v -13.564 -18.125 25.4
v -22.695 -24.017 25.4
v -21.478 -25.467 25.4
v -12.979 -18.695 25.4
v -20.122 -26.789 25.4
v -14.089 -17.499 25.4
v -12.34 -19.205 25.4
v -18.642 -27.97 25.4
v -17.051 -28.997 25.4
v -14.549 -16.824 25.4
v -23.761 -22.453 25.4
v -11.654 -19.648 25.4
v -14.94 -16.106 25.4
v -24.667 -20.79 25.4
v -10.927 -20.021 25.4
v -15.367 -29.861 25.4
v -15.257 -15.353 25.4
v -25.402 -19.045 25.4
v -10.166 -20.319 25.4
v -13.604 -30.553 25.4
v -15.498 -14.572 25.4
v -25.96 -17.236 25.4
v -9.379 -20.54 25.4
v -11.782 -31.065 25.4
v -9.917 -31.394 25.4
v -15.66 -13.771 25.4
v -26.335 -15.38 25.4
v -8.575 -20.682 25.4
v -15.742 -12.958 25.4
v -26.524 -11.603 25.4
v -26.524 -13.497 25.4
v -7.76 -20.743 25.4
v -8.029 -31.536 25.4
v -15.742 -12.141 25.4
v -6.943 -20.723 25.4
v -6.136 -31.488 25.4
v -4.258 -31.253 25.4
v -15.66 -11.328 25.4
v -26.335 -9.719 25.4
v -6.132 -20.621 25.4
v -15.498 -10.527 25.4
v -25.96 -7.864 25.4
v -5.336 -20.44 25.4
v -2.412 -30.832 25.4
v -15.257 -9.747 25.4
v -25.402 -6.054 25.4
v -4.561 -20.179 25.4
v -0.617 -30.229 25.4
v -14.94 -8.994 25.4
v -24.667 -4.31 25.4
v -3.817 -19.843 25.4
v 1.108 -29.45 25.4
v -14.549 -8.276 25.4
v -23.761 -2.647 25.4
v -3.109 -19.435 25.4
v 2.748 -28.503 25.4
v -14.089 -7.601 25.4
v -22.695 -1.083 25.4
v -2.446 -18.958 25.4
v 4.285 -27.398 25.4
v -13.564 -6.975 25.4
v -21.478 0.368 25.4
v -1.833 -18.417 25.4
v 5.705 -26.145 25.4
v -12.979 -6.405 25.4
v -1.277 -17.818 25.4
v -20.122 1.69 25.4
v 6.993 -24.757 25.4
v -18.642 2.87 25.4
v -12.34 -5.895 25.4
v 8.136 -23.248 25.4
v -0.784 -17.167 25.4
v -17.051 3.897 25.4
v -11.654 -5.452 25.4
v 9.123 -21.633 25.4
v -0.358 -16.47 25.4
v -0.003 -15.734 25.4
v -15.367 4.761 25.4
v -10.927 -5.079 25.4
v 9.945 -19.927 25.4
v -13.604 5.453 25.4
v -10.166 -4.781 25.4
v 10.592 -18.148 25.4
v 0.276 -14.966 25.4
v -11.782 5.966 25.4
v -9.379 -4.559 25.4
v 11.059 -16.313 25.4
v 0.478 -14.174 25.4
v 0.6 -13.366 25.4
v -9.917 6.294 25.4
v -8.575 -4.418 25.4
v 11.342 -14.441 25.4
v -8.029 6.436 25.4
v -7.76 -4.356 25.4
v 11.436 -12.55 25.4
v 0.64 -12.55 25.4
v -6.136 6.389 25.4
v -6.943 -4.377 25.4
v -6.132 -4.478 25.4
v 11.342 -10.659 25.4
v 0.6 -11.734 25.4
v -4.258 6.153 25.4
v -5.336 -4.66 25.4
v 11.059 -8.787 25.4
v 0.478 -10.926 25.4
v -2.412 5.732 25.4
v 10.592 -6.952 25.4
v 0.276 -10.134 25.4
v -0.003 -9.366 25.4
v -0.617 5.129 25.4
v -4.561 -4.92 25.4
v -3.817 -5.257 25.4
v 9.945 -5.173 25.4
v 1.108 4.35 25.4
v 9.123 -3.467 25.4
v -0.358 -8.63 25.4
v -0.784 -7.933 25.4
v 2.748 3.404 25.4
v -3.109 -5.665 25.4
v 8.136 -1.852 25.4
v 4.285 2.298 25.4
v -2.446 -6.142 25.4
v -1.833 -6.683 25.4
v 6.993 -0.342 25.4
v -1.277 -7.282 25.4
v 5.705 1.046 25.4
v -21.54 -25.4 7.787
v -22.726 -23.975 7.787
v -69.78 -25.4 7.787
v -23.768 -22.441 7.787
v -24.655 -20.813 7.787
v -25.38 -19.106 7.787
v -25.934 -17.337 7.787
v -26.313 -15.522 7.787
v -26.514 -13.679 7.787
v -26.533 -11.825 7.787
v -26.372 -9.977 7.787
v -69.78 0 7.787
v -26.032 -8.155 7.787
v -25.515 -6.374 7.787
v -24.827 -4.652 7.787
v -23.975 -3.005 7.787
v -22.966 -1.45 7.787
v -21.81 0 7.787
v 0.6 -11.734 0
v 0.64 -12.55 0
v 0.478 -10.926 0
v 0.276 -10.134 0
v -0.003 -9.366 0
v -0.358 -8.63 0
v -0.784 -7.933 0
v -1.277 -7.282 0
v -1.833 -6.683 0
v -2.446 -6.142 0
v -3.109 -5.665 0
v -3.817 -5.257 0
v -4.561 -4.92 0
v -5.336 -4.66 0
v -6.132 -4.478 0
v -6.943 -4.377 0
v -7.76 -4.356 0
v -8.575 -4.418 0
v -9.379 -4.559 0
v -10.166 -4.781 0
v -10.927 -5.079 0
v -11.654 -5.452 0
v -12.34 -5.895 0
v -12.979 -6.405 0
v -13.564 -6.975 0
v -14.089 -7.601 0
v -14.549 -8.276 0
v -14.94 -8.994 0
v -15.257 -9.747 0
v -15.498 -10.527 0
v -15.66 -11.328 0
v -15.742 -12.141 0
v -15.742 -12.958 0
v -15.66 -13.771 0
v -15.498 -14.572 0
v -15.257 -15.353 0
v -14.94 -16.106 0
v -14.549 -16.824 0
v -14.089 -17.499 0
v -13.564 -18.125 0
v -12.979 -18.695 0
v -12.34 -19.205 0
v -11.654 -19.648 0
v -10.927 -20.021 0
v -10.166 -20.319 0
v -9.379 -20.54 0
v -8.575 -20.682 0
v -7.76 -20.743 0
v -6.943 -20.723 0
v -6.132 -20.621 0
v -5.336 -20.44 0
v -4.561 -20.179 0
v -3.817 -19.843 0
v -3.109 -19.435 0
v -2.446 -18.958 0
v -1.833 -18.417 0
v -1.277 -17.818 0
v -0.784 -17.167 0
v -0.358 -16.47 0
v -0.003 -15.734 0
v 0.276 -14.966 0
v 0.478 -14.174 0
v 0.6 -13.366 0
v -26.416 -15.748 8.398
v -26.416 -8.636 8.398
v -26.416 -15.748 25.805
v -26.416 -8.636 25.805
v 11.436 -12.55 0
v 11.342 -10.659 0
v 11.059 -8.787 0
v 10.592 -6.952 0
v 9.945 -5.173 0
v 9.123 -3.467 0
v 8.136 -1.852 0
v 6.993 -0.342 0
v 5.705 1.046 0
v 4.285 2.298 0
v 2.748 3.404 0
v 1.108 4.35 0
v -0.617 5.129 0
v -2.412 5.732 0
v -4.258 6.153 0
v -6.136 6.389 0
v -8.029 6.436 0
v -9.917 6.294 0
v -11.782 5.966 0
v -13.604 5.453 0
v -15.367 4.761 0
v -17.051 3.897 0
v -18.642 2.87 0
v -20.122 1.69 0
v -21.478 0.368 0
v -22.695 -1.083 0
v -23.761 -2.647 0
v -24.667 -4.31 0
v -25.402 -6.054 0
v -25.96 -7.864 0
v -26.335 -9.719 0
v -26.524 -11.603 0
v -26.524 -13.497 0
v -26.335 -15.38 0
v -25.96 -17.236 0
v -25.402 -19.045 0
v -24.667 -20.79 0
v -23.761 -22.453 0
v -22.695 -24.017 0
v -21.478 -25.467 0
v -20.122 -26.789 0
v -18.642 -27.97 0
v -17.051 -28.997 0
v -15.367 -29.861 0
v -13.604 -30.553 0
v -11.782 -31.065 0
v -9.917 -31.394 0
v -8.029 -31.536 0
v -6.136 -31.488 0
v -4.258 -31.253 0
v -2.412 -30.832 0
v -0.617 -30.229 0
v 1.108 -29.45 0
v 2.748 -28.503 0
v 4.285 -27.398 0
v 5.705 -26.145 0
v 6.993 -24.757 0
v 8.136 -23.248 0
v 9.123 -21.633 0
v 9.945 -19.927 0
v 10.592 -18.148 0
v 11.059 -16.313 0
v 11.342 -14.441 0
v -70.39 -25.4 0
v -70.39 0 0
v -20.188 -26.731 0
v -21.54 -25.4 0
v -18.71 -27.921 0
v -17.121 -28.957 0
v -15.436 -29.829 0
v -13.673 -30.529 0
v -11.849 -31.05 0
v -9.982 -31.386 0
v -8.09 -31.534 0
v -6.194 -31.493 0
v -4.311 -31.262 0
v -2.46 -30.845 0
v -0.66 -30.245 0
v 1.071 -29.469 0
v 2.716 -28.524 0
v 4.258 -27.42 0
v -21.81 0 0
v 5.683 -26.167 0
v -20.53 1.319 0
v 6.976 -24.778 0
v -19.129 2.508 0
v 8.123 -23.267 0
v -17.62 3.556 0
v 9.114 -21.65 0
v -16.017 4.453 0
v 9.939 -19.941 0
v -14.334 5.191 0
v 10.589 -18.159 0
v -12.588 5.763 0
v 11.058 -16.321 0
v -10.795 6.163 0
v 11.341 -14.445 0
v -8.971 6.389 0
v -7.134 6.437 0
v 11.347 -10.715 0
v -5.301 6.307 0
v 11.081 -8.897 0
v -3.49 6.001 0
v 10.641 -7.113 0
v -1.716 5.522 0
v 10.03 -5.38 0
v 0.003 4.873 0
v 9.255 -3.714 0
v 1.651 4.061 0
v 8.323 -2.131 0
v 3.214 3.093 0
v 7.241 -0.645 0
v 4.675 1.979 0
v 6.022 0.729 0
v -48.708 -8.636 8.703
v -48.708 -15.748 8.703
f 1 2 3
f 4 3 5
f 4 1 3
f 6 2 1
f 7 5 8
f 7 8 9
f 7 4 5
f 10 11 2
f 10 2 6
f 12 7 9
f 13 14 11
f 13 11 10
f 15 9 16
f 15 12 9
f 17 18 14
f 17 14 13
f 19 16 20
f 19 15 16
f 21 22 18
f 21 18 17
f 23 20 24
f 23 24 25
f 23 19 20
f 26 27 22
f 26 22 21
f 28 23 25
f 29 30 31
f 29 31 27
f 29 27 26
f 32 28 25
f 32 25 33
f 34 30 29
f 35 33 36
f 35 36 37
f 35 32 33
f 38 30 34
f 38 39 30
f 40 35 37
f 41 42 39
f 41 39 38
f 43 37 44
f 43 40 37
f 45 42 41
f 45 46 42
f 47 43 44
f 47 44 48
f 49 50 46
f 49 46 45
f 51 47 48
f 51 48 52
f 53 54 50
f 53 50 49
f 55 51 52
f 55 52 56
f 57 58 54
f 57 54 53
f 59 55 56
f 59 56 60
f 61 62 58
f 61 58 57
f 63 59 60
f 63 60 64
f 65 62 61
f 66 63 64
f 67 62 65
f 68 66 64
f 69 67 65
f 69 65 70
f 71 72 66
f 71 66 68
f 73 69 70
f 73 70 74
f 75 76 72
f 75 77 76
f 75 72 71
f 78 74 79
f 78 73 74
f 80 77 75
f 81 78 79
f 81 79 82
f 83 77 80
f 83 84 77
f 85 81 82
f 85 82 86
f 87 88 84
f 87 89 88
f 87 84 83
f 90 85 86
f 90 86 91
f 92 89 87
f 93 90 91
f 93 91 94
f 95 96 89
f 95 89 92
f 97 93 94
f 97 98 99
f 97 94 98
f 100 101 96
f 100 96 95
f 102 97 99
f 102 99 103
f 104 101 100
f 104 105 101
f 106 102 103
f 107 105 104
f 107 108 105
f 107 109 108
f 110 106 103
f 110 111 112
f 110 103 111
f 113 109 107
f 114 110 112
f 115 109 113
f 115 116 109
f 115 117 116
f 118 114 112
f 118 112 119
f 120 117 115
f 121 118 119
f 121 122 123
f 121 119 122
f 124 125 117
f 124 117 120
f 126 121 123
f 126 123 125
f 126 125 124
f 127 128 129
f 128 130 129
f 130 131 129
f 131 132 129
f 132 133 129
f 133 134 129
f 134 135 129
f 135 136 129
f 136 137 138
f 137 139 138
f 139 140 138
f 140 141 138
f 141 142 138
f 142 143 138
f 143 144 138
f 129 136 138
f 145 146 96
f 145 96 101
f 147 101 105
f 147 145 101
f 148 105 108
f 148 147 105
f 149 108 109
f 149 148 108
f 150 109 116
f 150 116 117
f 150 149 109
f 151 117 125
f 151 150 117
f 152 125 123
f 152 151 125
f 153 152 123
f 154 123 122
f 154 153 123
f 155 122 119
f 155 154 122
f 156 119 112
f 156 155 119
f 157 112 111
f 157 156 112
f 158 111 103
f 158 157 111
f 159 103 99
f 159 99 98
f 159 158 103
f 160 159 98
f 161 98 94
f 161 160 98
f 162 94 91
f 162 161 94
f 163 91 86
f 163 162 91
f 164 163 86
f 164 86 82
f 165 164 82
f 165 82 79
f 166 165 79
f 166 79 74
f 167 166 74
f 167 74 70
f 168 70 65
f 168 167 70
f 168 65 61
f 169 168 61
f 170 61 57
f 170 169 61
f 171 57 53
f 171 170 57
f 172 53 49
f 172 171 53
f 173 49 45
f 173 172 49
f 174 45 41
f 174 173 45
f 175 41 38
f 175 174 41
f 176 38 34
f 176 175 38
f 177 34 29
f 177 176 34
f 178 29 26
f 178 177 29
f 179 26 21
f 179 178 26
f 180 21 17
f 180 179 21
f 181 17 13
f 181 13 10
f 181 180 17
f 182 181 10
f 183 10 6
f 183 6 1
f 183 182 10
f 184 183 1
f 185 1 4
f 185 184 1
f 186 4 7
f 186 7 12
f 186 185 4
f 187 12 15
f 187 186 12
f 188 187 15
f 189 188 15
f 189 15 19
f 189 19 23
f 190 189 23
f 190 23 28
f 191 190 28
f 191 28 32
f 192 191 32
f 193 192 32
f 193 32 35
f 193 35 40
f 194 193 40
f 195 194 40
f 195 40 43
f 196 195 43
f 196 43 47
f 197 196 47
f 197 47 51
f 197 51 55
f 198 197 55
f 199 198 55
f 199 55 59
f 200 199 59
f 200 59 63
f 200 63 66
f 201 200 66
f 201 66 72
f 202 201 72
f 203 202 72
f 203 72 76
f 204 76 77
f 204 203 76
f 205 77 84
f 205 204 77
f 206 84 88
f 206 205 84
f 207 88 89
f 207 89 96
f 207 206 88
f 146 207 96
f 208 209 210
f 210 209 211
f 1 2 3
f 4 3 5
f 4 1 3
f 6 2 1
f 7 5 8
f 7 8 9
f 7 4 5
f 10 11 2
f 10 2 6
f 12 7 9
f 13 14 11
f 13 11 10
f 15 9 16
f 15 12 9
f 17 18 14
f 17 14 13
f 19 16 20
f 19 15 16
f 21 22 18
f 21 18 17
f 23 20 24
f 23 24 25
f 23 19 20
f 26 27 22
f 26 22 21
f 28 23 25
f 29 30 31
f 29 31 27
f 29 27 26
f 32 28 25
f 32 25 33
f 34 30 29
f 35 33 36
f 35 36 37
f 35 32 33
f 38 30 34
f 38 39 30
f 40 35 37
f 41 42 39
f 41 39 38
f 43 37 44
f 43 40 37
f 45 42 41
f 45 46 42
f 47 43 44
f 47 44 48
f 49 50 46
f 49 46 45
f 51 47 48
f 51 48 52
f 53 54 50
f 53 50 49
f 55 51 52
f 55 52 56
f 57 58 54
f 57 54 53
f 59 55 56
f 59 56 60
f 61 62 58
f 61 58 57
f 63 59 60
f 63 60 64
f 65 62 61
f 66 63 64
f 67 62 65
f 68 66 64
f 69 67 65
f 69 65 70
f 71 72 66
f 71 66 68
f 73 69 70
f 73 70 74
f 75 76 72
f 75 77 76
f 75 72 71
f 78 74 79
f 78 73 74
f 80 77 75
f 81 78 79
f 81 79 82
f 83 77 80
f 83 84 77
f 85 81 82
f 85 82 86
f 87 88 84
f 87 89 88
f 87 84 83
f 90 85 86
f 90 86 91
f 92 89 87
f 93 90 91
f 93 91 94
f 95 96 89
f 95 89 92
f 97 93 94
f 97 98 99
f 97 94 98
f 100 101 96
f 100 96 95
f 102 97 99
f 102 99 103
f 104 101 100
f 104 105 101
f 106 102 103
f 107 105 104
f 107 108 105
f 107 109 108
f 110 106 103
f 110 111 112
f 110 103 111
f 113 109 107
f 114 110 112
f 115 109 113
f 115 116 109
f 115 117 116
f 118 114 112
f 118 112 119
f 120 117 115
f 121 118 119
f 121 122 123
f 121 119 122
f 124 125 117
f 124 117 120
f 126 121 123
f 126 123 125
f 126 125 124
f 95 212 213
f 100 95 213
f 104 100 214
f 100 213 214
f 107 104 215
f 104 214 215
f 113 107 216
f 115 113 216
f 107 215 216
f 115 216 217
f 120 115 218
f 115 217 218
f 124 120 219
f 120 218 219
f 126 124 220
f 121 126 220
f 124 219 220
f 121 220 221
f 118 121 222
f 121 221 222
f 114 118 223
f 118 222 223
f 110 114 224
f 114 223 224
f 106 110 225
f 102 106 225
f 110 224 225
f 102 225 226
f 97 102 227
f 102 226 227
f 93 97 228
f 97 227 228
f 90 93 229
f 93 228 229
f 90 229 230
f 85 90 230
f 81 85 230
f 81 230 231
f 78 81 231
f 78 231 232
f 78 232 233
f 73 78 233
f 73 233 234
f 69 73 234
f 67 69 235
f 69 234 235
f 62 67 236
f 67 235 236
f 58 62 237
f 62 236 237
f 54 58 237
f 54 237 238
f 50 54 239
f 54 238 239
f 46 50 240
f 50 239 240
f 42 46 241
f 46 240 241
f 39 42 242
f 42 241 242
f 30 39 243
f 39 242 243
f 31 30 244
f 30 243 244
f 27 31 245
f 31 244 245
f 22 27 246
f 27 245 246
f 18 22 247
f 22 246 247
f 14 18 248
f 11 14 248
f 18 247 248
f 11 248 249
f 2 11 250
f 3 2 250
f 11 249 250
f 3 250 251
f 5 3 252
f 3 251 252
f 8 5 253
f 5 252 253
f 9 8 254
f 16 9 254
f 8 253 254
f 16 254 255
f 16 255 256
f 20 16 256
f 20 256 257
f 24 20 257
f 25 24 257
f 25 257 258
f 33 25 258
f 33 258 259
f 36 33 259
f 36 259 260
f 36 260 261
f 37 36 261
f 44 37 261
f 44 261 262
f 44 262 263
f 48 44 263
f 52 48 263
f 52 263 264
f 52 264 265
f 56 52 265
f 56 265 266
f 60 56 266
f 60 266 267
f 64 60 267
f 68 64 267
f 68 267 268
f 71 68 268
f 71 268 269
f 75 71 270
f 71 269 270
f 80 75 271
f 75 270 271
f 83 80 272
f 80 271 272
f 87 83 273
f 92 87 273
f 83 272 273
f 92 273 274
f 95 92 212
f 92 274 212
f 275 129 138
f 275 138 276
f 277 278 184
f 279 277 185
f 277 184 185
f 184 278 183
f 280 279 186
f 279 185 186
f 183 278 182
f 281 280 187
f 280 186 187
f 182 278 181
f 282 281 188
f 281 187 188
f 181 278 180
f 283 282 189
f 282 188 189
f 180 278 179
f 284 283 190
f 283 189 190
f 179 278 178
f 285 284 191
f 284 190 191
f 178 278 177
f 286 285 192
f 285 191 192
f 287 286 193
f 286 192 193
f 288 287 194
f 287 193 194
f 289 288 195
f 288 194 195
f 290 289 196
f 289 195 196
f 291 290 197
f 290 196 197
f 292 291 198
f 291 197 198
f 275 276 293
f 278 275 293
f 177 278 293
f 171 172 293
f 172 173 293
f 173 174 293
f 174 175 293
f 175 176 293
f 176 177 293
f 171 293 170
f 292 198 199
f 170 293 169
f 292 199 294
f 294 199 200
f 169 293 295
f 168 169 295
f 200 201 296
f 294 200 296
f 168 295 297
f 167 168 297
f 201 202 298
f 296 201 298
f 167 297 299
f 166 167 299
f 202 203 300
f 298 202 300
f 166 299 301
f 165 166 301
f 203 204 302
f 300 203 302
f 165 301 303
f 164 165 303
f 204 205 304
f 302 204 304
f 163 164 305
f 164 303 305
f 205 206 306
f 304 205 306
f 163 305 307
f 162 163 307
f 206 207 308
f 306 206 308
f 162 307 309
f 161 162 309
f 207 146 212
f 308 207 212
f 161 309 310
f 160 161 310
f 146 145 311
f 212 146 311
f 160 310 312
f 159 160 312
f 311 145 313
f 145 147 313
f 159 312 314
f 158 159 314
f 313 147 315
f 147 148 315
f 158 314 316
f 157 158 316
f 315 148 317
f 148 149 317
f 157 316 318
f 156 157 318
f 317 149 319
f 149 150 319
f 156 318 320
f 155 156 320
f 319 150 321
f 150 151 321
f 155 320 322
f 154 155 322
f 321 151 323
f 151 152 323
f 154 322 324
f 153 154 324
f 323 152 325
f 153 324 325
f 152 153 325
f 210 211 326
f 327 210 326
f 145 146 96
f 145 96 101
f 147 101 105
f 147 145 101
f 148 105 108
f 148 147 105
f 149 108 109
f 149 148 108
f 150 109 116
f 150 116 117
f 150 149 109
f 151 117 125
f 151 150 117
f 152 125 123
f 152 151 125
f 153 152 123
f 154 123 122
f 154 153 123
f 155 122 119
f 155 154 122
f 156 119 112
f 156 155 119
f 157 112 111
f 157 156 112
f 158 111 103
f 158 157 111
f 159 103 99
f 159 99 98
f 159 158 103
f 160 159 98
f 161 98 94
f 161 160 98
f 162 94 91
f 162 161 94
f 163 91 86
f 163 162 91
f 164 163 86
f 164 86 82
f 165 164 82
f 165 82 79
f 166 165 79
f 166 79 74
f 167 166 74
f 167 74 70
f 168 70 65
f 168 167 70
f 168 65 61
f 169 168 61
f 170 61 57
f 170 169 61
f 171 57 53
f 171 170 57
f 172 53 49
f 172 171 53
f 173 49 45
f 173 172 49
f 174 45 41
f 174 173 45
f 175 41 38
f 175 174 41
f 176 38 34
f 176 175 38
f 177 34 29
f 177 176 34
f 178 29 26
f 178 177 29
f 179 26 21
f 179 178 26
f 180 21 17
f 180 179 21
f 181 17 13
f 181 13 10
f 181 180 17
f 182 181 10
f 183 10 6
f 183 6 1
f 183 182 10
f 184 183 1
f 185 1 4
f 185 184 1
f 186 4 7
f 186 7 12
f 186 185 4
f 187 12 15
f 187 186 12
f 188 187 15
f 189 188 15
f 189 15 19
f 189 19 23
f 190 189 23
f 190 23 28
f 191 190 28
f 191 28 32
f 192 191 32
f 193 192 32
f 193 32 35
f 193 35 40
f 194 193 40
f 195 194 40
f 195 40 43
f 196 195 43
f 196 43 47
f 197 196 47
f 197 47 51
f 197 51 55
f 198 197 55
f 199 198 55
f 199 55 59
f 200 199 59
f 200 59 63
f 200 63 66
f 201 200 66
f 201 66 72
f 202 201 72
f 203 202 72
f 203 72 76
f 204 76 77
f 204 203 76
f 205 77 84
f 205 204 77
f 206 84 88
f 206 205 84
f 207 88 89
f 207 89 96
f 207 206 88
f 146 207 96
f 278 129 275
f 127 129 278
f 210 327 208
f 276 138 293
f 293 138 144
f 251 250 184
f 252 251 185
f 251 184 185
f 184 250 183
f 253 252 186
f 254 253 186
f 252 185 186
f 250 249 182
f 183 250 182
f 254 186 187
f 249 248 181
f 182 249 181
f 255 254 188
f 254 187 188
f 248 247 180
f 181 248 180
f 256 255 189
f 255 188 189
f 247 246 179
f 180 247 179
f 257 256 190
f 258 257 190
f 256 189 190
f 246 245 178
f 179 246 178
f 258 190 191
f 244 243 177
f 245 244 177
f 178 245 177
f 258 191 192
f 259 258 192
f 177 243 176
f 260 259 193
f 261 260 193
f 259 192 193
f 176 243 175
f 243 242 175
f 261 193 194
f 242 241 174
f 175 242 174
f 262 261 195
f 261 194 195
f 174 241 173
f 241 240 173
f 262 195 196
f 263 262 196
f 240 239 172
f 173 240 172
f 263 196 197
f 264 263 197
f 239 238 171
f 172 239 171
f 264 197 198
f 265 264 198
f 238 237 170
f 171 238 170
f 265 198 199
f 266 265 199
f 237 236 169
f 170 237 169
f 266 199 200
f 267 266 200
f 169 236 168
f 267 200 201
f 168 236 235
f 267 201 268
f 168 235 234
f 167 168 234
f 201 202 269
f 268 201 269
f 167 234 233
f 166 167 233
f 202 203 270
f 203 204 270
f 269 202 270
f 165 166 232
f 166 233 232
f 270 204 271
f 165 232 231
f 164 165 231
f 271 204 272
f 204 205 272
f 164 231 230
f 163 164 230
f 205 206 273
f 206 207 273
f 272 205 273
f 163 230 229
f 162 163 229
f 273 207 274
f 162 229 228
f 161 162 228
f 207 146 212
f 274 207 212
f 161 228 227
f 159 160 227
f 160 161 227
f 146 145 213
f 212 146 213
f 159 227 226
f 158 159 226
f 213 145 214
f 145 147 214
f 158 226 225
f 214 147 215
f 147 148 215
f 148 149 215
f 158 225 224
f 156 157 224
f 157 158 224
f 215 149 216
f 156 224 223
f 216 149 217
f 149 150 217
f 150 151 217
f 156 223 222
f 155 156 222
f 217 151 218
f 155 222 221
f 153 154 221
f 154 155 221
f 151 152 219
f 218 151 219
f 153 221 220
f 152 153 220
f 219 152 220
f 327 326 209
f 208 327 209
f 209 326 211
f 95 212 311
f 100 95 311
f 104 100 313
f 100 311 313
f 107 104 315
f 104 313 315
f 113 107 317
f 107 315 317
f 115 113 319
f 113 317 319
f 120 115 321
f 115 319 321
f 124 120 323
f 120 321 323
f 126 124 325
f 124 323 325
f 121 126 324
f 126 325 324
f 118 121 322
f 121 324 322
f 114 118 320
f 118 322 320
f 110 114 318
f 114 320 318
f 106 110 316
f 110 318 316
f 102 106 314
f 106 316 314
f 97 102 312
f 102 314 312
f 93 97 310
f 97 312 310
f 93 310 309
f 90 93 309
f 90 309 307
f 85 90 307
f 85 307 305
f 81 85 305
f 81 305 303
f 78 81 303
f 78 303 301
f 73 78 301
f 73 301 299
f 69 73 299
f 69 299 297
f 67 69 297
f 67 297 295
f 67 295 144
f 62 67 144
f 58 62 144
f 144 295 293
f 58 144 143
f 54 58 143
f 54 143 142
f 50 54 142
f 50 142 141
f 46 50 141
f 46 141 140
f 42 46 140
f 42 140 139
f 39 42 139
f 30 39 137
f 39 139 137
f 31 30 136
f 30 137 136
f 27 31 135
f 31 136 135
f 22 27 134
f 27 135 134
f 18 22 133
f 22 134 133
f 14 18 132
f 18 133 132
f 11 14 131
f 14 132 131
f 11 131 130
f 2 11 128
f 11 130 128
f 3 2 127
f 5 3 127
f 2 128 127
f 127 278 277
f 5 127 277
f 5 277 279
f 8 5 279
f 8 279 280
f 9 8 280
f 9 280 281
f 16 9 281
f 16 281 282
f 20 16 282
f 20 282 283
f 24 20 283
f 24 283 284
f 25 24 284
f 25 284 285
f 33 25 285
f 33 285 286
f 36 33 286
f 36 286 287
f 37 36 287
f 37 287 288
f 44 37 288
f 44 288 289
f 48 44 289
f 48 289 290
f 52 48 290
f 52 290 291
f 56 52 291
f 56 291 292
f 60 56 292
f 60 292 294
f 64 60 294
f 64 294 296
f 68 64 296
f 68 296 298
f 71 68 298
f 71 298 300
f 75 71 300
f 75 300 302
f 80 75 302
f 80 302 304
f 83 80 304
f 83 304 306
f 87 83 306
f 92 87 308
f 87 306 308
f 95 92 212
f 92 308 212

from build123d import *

# Parameters (mm, degrees)
F1_DEPTH = 25.4
F2_R     = 18.991619
F2_R_2   = 8.196011
F3_DEPTH = 25.4
F5_DEPTH = 7.112
F7_DEPTH = 25.4


with BuildPart() as f1:
    # F0 (on Front) → F1 (new body)
    with BuildSketch(Plane.XZ):
        Polygon((-69.779716, 7.787233), (-70.390478, 0), (-21.529408, 0), (-21.529408, 7.787233), align=None)
    extrude(amount=F1_DEPTH)

    # F2 (on Top) → F3 (join)
    with BuildSketch(Plane.XY):
        with Locations((-7.555679, -12.549907)):
            Circle(F2_R)
        with Locations((-7.555679, -12.549907)):
            Circle(F2_R_2, mode=Mode.SUBTRACT)
    extrude(amount=F3_DEPTH)


with BuildPart() as f5:
    # F4 (on Front) → F5 (new body)
    with BuildSketch(Plane.XZ):
        Polygon((-26.415514, 8.397996), (-26.415514, 25.804752), (-48.708379, 8.703378), align=None)
    extrude(amount=F5_DEPTH)


with BuildPart() as f5_1:
    # F6: moved
    add(f5.part.moved(Location((0, -6.096, 0))))


with BuildPart() as f7:
    # F2 (on Top) → F7 (new body)
    with BuildSketch(Plane.XY):
        with Locations((-7.555679, -12.549907)):
            Circle(F2_R)
        with Locations((-7.555679, -12.549907)):
            Circle(F2_R_2, mode=Mode.SUBTRACT)
    extrude(amount=F7_DEPTH)


with BuildPart() as f5_2:
    # F8: moved
    add(f5_1.part.moved(Location((0, -2.54, 0))))


solid = Compound([f1.part, f7.part, f5_2.part])
